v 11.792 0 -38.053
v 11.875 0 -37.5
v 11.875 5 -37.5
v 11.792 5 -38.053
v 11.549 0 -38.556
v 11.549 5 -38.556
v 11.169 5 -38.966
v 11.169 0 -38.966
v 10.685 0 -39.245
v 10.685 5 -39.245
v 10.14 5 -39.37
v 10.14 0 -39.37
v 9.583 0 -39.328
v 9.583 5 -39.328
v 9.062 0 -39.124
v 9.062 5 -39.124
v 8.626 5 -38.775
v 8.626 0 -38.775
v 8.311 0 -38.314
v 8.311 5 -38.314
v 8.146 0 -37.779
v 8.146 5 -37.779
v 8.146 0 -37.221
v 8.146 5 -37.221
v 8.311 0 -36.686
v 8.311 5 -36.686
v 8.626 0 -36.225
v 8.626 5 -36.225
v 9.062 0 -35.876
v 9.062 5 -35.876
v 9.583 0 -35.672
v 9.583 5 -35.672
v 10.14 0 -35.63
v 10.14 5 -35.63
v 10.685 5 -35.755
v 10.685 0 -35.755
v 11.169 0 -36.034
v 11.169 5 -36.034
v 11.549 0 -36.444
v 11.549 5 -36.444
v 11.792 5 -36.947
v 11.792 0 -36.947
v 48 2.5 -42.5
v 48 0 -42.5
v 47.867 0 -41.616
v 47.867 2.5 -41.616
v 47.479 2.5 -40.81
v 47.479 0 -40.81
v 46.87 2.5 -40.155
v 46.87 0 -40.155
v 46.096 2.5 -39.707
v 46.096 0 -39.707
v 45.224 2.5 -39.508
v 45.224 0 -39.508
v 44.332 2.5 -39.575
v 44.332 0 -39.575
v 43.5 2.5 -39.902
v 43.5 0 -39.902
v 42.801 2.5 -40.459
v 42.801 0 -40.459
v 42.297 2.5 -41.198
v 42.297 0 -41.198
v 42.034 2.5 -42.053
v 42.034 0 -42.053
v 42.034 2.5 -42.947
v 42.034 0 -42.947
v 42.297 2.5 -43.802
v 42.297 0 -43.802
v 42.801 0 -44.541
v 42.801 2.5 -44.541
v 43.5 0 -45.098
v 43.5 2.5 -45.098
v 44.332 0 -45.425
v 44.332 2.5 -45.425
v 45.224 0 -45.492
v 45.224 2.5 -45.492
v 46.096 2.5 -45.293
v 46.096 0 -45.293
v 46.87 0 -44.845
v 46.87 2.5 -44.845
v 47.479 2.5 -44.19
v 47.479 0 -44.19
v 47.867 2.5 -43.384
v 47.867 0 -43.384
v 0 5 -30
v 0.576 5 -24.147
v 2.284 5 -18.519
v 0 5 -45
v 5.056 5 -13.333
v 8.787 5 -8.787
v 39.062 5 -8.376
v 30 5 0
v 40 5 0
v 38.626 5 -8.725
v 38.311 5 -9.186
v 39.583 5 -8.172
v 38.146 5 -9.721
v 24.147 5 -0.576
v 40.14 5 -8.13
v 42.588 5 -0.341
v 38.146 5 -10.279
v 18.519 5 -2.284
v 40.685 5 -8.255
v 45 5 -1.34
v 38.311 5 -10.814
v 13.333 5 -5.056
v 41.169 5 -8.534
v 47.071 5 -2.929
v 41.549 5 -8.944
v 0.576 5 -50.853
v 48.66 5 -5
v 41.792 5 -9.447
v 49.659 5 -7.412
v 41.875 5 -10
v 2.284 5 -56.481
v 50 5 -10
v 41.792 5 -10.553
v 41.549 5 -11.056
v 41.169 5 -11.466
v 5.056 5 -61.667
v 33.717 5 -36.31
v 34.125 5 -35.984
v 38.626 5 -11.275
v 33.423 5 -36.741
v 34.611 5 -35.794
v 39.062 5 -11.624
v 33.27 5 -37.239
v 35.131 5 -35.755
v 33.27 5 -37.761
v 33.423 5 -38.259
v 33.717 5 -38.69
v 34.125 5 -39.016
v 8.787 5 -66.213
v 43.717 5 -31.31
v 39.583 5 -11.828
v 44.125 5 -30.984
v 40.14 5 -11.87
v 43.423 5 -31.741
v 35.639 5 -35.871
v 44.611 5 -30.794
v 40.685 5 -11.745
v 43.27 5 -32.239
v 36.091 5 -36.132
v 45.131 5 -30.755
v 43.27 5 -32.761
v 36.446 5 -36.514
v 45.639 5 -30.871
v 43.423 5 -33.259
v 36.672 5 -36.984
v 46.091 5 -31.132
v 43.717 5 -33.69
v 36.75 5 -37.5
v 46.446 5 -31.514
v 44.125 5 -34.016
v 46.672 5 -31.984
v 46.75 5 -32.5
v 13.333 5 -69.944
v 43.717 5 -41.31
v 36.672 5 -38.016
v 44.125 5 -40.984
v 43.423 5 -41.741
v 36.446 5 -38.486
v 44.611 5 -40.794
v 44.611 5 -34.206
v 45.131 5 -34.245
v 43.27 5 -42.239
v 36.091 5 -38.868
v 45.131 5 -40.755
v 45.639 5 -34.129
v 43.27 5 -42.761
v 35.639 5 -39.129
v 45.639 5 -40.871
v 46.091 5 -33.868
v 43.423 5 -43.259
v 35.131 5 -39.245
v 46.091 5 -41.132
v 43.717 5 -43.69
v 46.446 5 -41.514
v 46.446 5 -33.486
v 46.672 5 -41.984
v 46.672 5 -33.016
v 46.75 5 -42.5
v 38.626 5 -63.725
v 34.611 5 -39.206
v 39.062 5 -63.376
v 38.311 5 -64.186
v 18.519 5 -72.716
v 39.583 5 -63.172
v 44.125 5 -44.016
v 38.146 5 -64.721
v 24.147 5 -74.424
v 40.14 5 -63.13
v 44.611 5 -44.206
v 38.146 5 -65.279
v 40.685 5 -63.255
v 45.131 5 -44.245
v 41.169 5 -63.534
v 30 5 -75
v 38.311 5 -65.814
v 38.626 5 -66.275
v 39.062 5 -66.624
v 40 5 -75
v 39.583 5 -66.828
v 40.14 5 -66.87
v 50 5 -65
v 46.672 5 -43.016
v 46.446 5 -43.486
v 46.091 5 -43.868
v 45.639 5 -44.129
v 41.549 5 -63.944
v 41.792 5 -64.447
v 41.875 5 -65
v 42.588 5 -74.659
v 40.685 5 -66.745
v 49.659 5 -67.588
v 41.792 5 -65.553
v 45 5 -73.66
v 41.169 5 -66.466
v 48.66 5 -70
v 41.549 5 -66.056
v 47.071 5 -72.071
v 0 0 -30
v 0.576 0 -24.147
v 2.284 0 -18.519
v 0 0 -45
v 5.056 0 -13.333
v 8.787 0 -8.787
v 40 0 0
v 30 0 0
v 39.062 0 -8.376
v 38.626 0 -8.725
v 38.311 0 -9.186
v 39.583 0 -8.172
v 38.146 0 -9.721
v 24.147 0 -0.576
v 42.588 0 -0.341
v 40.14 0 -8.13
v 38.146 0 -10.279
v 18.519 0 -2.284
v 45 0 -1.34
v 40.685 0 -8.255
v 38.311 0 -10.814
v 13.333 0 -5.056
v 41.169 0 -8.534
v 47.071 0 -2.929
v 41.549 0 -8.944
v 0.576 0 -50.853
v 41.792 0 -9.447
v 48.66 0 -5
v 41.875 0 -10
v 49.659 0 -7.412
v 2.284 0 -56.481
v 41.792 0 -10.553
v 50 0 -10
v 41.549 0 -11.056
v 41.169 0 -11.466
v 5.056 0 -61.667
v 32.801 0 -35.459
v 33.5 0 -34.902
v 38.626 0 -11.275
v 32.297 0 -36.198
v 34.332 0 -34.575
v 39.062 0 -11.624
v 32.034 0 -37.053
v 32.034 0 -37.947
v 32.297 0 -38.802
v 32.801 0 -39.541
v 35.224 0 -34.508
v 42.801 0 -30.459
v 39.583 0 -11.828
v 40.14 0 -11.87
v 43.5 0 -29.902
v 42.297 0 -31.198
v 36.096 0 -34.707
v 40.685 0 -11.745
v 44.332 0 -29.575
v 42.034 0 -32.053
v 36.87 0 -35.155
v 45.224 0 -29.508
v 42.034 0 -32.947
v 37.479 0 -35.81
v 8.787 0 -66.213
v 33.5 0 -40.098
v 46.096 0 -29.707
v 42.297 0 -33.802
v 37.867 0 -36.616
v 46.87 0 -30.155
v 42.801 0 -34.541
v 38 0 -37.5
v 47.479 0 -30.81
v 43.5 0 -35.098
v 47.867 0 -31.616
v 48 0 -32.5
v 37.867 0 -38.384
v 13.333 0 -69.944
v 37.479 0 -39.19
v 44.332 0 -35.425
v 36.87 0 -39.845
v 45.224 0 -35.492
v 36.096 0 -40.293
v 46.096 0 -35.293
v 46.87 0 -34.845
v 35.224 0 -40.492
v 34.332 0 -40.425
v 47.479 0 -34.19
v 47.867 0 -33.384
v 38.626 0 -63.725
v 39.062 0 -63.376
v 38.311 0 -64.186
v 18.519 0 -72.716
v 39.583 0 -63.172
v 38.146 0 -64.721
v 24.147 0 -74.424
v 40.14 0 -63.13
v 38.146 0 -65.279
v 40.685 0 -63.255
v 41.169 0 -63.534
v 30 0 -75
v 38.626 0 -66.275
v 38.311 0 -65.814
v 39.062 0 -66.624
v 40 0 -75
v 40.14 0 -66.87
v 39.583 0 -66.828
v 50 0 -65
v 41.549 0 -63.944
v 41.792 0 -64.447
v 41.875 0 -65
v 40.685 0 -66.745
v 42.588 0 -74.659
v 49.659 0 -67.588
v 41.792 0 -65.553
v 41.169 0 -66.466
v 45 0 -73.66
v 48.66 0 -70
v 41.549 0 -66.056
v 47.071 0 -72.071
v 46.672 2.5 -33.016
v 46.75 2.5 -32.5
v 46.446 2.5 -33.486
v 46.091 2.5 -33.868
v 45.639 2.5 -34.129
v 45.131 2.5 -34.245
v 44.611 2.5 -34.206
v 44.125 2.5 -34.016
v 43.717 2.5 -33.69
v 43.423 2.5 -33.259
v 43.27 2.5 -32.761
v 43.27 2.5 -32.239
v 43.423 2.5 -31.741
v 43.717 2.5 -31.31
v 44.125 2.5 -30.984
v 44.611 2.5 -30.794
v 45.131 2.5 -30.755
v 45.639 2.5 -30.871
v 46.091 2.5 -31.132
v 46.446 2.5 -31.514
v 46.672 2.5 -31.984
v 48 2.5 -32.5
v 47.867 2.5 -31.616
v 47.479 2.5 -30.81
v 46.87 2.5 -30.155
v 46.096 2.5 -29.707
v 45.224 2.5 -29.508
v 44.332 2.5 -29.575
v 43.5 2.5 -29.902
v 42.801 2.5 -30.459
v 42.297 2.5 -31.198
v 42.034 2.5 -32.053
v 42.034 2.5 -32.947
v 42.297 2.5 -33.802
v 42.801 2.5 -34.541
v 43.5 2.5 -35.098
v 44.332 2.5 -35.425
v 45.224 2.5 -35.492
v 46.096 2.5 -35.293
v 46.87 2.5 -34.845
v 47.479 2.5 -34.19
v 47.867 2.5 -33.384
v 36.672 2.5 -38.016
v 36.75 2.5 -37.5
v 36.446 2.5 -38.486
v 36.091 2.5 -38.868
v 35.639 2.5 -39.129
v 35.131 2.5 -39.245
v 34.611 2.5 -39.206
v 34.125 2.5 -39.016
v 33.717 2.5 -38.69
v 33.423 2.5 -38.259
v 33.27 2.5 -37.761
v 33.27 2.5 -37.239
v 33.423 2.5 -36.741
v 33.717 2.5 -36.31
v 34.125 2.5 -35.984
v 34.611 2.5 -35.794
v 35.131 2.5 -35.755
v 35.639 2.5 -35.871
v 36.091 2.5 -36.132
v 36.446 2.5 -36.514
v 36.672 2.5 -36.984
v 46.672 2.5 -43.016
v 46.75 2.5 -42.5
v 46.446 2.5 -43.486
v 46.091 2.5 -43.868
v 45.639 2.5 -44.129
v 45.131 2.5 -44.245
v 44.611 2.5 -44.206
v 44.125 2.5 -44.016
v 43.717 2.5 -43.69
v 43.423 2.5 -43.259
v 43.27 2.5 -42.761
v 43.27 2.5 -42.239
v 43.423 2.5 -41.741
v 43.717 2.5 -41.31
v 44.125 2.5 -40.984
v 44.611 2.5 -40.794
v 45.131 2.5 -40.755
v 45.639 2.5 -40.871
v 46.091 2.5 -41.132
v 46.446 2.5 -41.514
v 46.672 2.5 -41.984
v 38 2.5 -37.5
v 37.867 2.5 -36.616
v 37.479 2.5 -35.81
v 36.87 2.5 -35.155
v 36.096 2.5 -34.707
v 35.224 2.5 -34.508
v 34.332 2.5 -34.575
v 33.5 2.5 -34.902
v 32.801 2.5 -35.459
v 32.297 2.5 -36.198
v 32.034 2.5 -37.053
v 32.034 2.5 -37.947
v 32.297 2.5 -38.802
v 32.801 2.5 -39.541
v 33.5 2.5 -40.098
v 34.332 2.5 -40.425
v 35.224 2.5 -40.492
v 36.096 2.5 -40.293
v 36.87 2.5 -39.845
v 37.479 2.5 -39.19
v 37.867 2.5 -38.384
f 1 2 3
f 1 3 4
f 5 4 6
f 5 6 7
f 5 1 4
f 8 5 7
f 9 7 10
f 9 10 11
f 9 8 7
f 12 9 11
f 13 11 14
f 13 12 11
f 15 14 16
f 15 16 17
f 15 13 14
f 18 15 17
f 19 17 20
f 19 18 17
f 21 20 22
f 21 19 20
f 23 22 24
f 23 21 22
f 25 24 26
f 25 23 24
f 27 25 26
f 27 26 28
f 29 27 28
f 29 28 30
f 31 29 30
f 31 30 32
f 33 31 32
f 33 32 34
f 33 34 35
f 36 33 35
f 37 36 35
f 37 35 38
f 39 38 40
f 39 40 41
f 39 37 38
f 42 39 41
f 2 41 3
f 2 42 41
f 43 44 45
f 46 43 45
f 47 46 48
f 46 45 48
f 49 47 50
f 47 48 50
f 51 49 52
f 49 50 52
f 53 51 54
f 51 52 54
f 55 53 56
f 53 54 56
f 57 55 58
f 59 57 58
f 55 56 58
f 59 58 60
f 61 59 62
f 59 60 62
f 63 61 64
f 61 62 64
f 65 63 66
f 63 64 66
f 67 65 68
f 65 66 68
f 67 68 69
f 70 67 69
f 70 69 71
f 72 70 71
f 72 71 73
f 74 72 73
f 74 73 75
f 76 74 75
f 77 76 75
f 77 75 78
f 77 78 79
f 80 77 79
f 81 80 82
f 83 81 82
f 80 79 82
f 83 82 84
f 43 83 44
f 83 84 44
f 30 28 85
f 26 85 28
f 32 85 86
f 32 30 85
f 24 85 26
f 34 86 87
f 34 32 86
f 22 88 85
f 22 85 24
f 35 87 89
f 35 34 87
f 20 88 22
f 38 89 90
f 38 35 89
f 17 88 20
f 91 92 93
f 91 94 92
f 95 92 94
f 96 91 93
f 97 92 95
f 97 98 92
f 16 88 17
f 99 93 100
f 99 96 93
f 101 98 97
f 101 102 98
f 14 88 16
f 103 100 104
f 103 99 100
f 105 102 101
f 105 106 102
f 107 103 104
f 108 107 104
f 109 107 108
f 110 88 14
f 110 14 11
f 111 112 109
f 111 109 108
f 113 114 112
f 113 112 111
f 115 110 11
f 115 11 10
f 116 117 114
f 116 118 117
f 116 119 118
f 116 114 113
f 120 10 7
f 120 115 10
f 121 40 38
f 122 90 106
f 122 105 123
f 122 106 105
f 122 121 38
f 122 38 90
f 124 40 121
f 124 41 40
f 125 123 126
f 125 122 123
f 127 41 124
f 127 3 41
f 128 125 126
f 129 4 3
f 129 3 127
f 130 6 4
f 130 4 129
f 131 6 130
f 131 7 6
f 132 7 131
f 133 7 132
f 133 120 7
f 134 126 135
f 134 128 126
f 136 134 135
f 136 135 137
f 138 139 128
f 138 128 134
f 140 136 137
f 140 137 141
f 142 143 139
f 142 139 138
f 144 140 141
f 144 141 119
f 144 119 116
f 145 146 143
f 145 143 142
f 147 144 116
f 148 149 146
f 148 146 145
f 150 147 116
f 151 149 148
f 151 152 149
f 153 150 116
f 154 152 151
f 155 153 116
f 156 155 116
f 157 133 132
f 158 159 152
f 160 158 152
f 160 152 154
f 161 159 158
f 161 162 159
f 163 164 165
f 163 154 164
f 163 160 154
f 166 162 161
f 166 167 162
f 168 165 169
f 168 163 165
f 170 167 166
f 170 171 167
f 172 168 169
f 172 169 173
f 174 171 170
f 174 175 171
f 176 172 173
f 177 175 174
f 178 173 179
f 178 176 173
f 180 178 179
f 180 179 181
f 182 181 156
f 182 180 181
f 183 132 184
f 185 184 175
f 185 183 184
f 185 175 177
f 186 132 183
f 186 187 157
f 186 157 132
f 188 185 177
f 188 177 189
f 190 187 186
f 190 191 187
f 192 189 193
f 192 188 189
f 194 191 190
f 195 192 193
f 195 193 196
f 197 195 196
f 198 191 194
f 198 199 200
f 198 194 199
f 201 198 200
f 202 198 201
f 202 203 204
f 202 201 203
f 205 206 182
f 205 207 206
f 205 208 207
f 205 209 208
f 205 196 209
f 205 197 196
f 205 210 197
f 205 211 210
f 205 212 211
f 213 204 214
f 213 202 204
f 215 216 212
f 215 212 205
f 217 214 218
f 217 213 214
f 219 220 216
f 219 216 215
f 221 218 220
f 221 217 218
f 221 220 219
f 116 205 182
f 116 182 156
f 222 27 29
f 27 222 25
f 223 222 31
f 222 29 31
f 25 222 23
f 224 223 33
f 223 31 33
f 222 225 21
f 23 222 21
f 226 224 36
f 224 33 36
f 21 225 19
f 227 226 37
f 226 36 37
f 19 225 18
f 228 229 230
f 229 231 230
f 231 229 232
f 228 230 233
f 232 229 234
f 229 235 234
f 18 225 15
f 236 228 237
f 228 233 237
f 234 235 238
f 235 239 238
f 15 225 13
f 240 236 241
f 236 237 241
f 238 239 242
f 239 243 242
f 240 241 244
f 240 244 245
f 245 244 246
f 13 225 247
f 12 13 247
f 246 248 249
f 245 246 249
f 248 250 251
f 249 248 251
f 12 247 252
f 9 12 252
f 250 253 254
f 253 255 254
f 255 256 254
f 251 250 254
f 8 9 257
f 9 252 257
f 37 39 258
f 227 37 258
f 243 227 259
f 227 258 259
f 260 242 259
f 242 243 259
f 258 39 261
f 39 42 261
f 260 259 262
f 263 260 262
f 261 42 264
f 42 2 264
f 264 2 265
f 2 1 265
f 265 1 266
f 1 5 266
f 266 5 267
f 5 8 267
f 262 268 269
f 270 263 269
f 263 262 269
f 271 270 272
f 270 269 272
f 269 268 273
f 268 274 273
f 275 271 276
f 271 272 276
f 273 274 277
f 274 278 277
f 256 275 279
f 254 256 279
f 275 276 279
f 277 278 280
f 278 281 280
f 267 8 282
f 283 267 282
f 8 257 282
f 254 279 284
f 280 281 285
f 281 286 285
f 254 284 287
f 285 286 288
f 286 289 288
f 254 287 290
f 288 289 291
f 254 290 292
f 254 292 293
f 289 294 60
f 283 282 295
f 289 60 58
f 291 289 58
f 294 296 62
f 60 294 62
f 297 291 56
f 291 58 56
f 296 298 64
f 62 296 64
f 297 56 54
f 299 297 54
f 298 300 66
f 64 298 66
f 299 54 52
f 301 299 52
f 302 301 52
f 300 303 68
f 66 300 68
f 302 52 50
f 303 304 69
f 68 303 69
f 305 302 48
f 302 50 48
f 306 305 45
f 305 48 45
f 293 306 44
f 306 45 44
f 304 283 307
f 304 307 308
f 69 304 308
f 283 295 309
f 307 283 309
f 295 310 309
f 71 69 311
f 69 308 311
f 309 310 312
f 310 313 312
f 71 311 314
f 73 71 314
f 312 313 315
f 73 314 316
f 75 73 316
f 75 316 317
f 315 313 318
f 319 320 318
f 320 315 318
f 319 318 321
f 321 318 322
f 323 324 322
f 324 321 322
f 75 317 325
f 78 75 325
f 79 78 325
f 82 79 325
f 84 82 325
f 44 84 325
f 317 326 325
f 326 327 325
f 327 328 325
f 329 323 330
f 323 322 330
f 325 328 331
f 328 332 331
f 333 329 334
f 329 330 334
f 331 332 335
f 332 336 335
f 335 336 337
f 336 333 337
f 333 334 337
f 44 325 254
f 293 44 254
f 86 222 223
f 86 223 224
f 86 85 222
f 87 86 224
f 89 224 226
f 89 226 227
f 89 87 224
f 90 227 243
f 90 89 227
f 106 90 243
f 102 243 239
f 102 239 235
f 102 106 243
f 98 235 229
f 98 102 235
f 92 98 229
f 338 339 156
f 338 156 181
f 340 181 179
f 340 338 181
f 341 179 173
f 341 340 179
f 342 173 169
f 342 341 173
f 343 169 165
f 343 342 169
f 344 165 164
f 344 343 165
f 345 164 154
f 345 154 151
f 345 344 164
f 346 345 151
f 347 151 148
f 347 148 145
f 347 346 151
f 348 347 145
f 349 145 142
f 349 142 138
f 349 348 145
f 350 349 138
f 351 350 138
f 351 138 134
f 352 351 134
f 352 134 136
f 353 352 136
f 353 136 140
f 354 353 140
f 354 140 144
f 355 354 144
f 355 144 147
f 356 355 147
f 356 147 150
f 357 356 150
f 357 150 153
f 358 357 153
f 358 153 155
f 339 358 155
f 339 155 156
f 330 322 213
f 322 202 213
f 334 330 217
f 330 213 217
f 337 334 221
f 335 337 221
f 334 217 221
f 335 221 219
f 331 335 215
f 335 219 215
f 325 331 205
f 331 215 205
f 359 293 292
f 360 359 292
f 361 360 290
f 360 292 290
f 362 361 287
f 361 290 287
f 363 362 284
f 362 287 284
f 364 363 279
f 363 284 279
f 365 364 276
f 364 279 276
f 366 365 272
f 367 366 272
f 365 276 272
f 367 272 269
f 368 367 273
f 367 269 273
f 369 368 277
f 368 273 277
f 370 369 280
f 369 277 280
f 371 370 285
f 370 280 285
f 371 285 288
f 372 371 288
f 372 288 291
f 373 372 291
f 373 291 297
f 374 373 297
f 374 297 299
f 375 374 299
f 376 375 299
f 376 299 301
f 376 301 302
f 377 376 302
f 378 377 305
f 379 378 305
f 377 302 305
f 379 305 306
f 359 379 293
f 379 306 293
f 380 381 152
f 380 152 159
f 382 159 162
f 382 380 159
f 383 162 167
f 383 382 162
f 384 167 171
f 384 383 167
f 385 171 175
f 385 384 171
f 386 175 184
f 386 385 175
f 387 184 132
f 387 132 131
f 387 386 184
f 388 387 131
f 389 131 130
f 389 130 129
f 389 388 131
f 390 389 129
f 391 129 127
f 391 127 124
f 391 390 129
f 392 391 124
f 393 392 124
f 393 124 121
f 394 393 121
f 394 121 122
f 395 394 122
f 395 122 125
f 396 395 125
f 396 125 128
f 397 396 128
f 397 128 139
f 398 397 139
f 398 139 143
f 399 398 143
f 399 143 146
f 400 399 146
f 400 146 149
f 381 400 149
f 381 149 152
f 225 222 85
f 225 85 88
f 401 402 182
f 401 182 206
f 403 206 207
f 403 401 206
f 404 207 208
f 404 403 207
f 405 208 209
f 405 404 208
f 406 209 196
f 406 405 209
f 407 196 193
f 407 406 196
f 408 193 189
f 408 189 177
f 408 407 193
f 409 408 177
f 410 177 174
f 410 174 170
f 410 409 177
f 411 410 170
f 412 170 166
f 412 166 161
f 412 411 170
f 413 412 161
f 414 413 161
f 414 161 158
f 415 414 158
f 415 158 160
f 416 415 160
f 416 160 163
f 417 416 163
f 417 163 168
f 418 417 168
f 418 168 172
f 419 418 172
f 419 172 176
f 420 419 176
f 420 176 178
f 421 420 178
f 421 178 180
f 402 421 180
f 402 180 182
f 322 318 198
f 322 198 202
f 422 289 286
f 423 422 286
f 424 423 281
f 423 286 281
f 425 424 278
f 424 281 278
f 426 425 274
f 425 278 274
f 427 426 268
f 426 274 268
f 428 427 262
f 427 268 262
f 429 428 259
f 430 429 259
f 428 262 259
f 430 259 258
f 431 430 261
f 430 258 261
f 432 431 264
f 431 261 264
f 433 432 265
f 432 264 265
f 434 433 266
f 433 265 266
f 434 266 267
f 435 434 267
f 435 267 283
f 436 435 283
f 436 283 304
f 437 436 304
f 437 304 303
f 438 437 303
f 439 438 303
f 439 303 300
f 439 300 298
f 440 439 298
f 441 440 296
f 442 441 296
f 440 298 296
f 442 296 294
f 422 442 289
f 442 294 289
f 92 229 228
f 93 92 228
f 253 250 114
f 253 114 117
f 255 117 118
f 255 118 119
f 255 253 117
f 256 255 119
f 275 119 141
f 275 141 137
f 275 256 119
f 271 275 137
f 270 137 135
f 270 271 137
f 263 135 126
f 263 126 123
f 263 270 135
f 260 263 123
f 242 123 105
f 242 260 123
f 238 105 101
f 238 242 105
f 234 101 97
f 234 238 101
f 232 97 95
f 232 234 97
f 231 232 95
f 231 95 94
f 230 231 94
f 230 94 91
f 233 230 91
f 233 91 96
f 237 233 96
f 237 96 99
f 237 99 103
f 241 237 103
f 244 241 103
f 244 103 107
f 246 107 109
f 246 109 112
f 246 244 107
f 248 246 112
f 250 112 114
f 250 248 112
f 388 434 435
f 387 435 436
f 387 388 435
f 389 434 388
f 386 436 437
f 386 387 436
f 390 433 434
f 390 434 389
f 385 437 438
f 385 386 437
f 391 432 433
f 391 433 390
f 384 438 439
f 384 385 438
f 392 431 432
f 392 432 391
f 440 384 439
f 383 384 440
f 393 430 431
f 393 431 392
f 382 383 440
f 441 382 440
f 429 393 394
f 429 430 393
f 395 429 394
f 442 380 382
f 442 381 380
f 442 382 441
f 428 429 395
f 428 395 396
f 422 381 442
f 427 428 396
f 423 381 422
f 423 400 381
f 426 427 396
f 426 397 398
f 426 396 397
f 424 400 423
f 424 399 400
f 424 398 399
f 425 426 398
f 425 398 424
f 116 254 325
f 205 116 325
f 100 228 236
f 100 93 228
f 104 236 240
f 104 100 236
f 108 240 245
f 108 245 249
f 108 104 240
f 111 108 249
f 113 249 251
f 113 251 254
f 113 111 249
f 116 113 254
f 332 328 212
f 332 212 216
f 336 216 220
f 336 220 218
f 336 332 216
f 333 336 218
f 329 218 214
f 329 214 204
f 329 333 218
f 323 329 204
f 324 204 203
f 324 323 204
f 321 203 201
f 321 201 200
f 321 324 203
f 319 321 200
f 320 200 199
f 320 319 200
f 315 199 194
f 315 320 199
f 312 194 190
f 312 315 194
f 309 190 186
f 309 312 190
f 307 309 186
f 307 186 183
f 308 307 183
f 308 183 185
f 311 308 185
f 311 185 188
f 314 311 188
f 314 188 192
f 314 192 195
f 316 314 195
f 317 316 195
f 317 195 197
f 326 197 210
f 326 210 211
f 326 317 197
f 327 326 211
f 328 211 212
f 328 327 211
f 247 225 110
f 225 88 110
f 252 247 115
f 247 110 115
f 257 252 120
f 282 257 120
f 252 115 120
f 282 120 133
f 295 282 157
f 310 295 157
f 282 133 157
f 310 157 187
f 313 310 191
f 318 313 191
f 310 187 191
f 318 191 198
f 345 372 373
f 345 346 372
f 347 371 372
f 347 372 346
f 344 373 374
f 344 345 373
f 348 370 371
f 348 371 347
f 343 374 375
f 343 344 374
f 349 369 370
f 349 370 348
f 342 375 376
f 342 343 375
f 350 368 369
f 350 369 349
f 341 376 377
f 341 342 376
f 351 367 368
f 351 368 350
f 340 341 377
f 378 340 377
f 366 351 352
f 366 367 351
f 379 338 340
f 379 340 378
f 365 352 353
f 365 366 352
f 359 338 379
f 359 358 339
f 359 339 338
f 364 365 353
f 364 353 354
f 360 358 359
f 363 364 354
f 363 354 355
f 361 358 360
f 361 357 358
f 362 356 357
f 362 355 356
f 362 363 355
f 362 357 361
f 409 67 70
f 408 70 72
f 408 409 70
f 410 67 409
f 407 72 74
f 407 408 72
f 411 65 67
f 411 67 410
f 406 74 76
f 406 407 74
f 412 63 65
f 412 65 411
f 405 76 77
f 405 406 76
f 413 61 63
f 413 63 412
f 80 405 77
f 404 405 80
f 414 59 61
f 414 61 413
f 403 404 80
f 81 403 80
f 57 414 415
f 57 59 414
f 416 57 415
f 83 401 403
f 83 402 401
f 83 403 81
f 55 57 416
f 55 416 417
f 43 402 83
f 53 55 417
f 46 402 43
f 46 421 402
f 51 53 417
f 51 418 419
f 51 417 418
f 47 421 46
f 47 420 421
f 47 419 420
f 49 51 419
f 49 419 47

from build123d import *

# Parameters (mm, degrees)
SKETCH1_W           = 50
SKETCH1_H           = 75
SKETCH1_R           = 1.875
SKETCH1_R_2         = 1.75
BOSS_EXTRUDE1_DEPTH = 5
SKETCH2_R           = 3
CUT_EXTRUDE1_DEPTH  = 2.5
FILLET1_R           = 30
FILLET2_R           = 10


with BuildPart() as part:
    # Sketch1 → Boss-Extrude1 (new body)
    with BuildSketch(Plane(origin=(0, 0, 0), x_dir=(1, 0, 0), z_dir=(0, 1, 0))):
        with Locations((25, 37.5)):
            Rectangle(SKETCH1_W, SKETCH1_H)
        with Locations((40, 65)):
            Circle(SKETCH1_R, mode=Mode.SUBTRACT)
        with Locations((40, 10)):
            Circle(SKETCH1_R, mode=Mode.SUBTRACT)
        with Locations((10, 37.5)):
            Circle(SKETCH1_R, mode=Mode.SUBTRACT)
        with Locations((45, 42.5)):
            Circle(SKETCH1_R_2, mode=Mode.SUBTRACT)
        with Locations((45, 32.5)):
            Circle(SKETCH1_R_2, mode=Mode.SUBTRACT)
        with Locations((35, 37.5)):
            Circle(SKETCH1_R_2, mode=Mode.SUBTRACT)
    extrude(amount=BOSS_EXTRUDE1_DEPTH)

    # Sketch2 → Cut-Extrude1 (cut)
    with BuildSketch(Plane.XZ):
        with Locations((45, -32.5)):
            Circle(SKETCH2_R)
        with Locations((45, -42.5)):
            Circle(SKETCH2_R)
        with Locations((35, -37.5)):
            Circle(SKETCH2_R)
    extrude(amount=-CUT_EXTRUDE1_DEPTH, mode=Mode.SUBTRACT)

    # Fillet1
    fillet1_edges = [part.edges().sort_by_distance(p)[0] for p in [
        (0, 2.5, -75),
        (0, 2.5, 0),
    ]]
    fillet(fillet1_edges, radius=FILLET1_R)

    # Fillet2
    fillet2_edges = [part.edges().sort_by_distance(p)[0] for p in [
        (50, 2.5, -75),
        (50, 2.5, 0),
    ]]
    fillet(fillet2_edges, radius=FILLET2_R)


solid = part.part
